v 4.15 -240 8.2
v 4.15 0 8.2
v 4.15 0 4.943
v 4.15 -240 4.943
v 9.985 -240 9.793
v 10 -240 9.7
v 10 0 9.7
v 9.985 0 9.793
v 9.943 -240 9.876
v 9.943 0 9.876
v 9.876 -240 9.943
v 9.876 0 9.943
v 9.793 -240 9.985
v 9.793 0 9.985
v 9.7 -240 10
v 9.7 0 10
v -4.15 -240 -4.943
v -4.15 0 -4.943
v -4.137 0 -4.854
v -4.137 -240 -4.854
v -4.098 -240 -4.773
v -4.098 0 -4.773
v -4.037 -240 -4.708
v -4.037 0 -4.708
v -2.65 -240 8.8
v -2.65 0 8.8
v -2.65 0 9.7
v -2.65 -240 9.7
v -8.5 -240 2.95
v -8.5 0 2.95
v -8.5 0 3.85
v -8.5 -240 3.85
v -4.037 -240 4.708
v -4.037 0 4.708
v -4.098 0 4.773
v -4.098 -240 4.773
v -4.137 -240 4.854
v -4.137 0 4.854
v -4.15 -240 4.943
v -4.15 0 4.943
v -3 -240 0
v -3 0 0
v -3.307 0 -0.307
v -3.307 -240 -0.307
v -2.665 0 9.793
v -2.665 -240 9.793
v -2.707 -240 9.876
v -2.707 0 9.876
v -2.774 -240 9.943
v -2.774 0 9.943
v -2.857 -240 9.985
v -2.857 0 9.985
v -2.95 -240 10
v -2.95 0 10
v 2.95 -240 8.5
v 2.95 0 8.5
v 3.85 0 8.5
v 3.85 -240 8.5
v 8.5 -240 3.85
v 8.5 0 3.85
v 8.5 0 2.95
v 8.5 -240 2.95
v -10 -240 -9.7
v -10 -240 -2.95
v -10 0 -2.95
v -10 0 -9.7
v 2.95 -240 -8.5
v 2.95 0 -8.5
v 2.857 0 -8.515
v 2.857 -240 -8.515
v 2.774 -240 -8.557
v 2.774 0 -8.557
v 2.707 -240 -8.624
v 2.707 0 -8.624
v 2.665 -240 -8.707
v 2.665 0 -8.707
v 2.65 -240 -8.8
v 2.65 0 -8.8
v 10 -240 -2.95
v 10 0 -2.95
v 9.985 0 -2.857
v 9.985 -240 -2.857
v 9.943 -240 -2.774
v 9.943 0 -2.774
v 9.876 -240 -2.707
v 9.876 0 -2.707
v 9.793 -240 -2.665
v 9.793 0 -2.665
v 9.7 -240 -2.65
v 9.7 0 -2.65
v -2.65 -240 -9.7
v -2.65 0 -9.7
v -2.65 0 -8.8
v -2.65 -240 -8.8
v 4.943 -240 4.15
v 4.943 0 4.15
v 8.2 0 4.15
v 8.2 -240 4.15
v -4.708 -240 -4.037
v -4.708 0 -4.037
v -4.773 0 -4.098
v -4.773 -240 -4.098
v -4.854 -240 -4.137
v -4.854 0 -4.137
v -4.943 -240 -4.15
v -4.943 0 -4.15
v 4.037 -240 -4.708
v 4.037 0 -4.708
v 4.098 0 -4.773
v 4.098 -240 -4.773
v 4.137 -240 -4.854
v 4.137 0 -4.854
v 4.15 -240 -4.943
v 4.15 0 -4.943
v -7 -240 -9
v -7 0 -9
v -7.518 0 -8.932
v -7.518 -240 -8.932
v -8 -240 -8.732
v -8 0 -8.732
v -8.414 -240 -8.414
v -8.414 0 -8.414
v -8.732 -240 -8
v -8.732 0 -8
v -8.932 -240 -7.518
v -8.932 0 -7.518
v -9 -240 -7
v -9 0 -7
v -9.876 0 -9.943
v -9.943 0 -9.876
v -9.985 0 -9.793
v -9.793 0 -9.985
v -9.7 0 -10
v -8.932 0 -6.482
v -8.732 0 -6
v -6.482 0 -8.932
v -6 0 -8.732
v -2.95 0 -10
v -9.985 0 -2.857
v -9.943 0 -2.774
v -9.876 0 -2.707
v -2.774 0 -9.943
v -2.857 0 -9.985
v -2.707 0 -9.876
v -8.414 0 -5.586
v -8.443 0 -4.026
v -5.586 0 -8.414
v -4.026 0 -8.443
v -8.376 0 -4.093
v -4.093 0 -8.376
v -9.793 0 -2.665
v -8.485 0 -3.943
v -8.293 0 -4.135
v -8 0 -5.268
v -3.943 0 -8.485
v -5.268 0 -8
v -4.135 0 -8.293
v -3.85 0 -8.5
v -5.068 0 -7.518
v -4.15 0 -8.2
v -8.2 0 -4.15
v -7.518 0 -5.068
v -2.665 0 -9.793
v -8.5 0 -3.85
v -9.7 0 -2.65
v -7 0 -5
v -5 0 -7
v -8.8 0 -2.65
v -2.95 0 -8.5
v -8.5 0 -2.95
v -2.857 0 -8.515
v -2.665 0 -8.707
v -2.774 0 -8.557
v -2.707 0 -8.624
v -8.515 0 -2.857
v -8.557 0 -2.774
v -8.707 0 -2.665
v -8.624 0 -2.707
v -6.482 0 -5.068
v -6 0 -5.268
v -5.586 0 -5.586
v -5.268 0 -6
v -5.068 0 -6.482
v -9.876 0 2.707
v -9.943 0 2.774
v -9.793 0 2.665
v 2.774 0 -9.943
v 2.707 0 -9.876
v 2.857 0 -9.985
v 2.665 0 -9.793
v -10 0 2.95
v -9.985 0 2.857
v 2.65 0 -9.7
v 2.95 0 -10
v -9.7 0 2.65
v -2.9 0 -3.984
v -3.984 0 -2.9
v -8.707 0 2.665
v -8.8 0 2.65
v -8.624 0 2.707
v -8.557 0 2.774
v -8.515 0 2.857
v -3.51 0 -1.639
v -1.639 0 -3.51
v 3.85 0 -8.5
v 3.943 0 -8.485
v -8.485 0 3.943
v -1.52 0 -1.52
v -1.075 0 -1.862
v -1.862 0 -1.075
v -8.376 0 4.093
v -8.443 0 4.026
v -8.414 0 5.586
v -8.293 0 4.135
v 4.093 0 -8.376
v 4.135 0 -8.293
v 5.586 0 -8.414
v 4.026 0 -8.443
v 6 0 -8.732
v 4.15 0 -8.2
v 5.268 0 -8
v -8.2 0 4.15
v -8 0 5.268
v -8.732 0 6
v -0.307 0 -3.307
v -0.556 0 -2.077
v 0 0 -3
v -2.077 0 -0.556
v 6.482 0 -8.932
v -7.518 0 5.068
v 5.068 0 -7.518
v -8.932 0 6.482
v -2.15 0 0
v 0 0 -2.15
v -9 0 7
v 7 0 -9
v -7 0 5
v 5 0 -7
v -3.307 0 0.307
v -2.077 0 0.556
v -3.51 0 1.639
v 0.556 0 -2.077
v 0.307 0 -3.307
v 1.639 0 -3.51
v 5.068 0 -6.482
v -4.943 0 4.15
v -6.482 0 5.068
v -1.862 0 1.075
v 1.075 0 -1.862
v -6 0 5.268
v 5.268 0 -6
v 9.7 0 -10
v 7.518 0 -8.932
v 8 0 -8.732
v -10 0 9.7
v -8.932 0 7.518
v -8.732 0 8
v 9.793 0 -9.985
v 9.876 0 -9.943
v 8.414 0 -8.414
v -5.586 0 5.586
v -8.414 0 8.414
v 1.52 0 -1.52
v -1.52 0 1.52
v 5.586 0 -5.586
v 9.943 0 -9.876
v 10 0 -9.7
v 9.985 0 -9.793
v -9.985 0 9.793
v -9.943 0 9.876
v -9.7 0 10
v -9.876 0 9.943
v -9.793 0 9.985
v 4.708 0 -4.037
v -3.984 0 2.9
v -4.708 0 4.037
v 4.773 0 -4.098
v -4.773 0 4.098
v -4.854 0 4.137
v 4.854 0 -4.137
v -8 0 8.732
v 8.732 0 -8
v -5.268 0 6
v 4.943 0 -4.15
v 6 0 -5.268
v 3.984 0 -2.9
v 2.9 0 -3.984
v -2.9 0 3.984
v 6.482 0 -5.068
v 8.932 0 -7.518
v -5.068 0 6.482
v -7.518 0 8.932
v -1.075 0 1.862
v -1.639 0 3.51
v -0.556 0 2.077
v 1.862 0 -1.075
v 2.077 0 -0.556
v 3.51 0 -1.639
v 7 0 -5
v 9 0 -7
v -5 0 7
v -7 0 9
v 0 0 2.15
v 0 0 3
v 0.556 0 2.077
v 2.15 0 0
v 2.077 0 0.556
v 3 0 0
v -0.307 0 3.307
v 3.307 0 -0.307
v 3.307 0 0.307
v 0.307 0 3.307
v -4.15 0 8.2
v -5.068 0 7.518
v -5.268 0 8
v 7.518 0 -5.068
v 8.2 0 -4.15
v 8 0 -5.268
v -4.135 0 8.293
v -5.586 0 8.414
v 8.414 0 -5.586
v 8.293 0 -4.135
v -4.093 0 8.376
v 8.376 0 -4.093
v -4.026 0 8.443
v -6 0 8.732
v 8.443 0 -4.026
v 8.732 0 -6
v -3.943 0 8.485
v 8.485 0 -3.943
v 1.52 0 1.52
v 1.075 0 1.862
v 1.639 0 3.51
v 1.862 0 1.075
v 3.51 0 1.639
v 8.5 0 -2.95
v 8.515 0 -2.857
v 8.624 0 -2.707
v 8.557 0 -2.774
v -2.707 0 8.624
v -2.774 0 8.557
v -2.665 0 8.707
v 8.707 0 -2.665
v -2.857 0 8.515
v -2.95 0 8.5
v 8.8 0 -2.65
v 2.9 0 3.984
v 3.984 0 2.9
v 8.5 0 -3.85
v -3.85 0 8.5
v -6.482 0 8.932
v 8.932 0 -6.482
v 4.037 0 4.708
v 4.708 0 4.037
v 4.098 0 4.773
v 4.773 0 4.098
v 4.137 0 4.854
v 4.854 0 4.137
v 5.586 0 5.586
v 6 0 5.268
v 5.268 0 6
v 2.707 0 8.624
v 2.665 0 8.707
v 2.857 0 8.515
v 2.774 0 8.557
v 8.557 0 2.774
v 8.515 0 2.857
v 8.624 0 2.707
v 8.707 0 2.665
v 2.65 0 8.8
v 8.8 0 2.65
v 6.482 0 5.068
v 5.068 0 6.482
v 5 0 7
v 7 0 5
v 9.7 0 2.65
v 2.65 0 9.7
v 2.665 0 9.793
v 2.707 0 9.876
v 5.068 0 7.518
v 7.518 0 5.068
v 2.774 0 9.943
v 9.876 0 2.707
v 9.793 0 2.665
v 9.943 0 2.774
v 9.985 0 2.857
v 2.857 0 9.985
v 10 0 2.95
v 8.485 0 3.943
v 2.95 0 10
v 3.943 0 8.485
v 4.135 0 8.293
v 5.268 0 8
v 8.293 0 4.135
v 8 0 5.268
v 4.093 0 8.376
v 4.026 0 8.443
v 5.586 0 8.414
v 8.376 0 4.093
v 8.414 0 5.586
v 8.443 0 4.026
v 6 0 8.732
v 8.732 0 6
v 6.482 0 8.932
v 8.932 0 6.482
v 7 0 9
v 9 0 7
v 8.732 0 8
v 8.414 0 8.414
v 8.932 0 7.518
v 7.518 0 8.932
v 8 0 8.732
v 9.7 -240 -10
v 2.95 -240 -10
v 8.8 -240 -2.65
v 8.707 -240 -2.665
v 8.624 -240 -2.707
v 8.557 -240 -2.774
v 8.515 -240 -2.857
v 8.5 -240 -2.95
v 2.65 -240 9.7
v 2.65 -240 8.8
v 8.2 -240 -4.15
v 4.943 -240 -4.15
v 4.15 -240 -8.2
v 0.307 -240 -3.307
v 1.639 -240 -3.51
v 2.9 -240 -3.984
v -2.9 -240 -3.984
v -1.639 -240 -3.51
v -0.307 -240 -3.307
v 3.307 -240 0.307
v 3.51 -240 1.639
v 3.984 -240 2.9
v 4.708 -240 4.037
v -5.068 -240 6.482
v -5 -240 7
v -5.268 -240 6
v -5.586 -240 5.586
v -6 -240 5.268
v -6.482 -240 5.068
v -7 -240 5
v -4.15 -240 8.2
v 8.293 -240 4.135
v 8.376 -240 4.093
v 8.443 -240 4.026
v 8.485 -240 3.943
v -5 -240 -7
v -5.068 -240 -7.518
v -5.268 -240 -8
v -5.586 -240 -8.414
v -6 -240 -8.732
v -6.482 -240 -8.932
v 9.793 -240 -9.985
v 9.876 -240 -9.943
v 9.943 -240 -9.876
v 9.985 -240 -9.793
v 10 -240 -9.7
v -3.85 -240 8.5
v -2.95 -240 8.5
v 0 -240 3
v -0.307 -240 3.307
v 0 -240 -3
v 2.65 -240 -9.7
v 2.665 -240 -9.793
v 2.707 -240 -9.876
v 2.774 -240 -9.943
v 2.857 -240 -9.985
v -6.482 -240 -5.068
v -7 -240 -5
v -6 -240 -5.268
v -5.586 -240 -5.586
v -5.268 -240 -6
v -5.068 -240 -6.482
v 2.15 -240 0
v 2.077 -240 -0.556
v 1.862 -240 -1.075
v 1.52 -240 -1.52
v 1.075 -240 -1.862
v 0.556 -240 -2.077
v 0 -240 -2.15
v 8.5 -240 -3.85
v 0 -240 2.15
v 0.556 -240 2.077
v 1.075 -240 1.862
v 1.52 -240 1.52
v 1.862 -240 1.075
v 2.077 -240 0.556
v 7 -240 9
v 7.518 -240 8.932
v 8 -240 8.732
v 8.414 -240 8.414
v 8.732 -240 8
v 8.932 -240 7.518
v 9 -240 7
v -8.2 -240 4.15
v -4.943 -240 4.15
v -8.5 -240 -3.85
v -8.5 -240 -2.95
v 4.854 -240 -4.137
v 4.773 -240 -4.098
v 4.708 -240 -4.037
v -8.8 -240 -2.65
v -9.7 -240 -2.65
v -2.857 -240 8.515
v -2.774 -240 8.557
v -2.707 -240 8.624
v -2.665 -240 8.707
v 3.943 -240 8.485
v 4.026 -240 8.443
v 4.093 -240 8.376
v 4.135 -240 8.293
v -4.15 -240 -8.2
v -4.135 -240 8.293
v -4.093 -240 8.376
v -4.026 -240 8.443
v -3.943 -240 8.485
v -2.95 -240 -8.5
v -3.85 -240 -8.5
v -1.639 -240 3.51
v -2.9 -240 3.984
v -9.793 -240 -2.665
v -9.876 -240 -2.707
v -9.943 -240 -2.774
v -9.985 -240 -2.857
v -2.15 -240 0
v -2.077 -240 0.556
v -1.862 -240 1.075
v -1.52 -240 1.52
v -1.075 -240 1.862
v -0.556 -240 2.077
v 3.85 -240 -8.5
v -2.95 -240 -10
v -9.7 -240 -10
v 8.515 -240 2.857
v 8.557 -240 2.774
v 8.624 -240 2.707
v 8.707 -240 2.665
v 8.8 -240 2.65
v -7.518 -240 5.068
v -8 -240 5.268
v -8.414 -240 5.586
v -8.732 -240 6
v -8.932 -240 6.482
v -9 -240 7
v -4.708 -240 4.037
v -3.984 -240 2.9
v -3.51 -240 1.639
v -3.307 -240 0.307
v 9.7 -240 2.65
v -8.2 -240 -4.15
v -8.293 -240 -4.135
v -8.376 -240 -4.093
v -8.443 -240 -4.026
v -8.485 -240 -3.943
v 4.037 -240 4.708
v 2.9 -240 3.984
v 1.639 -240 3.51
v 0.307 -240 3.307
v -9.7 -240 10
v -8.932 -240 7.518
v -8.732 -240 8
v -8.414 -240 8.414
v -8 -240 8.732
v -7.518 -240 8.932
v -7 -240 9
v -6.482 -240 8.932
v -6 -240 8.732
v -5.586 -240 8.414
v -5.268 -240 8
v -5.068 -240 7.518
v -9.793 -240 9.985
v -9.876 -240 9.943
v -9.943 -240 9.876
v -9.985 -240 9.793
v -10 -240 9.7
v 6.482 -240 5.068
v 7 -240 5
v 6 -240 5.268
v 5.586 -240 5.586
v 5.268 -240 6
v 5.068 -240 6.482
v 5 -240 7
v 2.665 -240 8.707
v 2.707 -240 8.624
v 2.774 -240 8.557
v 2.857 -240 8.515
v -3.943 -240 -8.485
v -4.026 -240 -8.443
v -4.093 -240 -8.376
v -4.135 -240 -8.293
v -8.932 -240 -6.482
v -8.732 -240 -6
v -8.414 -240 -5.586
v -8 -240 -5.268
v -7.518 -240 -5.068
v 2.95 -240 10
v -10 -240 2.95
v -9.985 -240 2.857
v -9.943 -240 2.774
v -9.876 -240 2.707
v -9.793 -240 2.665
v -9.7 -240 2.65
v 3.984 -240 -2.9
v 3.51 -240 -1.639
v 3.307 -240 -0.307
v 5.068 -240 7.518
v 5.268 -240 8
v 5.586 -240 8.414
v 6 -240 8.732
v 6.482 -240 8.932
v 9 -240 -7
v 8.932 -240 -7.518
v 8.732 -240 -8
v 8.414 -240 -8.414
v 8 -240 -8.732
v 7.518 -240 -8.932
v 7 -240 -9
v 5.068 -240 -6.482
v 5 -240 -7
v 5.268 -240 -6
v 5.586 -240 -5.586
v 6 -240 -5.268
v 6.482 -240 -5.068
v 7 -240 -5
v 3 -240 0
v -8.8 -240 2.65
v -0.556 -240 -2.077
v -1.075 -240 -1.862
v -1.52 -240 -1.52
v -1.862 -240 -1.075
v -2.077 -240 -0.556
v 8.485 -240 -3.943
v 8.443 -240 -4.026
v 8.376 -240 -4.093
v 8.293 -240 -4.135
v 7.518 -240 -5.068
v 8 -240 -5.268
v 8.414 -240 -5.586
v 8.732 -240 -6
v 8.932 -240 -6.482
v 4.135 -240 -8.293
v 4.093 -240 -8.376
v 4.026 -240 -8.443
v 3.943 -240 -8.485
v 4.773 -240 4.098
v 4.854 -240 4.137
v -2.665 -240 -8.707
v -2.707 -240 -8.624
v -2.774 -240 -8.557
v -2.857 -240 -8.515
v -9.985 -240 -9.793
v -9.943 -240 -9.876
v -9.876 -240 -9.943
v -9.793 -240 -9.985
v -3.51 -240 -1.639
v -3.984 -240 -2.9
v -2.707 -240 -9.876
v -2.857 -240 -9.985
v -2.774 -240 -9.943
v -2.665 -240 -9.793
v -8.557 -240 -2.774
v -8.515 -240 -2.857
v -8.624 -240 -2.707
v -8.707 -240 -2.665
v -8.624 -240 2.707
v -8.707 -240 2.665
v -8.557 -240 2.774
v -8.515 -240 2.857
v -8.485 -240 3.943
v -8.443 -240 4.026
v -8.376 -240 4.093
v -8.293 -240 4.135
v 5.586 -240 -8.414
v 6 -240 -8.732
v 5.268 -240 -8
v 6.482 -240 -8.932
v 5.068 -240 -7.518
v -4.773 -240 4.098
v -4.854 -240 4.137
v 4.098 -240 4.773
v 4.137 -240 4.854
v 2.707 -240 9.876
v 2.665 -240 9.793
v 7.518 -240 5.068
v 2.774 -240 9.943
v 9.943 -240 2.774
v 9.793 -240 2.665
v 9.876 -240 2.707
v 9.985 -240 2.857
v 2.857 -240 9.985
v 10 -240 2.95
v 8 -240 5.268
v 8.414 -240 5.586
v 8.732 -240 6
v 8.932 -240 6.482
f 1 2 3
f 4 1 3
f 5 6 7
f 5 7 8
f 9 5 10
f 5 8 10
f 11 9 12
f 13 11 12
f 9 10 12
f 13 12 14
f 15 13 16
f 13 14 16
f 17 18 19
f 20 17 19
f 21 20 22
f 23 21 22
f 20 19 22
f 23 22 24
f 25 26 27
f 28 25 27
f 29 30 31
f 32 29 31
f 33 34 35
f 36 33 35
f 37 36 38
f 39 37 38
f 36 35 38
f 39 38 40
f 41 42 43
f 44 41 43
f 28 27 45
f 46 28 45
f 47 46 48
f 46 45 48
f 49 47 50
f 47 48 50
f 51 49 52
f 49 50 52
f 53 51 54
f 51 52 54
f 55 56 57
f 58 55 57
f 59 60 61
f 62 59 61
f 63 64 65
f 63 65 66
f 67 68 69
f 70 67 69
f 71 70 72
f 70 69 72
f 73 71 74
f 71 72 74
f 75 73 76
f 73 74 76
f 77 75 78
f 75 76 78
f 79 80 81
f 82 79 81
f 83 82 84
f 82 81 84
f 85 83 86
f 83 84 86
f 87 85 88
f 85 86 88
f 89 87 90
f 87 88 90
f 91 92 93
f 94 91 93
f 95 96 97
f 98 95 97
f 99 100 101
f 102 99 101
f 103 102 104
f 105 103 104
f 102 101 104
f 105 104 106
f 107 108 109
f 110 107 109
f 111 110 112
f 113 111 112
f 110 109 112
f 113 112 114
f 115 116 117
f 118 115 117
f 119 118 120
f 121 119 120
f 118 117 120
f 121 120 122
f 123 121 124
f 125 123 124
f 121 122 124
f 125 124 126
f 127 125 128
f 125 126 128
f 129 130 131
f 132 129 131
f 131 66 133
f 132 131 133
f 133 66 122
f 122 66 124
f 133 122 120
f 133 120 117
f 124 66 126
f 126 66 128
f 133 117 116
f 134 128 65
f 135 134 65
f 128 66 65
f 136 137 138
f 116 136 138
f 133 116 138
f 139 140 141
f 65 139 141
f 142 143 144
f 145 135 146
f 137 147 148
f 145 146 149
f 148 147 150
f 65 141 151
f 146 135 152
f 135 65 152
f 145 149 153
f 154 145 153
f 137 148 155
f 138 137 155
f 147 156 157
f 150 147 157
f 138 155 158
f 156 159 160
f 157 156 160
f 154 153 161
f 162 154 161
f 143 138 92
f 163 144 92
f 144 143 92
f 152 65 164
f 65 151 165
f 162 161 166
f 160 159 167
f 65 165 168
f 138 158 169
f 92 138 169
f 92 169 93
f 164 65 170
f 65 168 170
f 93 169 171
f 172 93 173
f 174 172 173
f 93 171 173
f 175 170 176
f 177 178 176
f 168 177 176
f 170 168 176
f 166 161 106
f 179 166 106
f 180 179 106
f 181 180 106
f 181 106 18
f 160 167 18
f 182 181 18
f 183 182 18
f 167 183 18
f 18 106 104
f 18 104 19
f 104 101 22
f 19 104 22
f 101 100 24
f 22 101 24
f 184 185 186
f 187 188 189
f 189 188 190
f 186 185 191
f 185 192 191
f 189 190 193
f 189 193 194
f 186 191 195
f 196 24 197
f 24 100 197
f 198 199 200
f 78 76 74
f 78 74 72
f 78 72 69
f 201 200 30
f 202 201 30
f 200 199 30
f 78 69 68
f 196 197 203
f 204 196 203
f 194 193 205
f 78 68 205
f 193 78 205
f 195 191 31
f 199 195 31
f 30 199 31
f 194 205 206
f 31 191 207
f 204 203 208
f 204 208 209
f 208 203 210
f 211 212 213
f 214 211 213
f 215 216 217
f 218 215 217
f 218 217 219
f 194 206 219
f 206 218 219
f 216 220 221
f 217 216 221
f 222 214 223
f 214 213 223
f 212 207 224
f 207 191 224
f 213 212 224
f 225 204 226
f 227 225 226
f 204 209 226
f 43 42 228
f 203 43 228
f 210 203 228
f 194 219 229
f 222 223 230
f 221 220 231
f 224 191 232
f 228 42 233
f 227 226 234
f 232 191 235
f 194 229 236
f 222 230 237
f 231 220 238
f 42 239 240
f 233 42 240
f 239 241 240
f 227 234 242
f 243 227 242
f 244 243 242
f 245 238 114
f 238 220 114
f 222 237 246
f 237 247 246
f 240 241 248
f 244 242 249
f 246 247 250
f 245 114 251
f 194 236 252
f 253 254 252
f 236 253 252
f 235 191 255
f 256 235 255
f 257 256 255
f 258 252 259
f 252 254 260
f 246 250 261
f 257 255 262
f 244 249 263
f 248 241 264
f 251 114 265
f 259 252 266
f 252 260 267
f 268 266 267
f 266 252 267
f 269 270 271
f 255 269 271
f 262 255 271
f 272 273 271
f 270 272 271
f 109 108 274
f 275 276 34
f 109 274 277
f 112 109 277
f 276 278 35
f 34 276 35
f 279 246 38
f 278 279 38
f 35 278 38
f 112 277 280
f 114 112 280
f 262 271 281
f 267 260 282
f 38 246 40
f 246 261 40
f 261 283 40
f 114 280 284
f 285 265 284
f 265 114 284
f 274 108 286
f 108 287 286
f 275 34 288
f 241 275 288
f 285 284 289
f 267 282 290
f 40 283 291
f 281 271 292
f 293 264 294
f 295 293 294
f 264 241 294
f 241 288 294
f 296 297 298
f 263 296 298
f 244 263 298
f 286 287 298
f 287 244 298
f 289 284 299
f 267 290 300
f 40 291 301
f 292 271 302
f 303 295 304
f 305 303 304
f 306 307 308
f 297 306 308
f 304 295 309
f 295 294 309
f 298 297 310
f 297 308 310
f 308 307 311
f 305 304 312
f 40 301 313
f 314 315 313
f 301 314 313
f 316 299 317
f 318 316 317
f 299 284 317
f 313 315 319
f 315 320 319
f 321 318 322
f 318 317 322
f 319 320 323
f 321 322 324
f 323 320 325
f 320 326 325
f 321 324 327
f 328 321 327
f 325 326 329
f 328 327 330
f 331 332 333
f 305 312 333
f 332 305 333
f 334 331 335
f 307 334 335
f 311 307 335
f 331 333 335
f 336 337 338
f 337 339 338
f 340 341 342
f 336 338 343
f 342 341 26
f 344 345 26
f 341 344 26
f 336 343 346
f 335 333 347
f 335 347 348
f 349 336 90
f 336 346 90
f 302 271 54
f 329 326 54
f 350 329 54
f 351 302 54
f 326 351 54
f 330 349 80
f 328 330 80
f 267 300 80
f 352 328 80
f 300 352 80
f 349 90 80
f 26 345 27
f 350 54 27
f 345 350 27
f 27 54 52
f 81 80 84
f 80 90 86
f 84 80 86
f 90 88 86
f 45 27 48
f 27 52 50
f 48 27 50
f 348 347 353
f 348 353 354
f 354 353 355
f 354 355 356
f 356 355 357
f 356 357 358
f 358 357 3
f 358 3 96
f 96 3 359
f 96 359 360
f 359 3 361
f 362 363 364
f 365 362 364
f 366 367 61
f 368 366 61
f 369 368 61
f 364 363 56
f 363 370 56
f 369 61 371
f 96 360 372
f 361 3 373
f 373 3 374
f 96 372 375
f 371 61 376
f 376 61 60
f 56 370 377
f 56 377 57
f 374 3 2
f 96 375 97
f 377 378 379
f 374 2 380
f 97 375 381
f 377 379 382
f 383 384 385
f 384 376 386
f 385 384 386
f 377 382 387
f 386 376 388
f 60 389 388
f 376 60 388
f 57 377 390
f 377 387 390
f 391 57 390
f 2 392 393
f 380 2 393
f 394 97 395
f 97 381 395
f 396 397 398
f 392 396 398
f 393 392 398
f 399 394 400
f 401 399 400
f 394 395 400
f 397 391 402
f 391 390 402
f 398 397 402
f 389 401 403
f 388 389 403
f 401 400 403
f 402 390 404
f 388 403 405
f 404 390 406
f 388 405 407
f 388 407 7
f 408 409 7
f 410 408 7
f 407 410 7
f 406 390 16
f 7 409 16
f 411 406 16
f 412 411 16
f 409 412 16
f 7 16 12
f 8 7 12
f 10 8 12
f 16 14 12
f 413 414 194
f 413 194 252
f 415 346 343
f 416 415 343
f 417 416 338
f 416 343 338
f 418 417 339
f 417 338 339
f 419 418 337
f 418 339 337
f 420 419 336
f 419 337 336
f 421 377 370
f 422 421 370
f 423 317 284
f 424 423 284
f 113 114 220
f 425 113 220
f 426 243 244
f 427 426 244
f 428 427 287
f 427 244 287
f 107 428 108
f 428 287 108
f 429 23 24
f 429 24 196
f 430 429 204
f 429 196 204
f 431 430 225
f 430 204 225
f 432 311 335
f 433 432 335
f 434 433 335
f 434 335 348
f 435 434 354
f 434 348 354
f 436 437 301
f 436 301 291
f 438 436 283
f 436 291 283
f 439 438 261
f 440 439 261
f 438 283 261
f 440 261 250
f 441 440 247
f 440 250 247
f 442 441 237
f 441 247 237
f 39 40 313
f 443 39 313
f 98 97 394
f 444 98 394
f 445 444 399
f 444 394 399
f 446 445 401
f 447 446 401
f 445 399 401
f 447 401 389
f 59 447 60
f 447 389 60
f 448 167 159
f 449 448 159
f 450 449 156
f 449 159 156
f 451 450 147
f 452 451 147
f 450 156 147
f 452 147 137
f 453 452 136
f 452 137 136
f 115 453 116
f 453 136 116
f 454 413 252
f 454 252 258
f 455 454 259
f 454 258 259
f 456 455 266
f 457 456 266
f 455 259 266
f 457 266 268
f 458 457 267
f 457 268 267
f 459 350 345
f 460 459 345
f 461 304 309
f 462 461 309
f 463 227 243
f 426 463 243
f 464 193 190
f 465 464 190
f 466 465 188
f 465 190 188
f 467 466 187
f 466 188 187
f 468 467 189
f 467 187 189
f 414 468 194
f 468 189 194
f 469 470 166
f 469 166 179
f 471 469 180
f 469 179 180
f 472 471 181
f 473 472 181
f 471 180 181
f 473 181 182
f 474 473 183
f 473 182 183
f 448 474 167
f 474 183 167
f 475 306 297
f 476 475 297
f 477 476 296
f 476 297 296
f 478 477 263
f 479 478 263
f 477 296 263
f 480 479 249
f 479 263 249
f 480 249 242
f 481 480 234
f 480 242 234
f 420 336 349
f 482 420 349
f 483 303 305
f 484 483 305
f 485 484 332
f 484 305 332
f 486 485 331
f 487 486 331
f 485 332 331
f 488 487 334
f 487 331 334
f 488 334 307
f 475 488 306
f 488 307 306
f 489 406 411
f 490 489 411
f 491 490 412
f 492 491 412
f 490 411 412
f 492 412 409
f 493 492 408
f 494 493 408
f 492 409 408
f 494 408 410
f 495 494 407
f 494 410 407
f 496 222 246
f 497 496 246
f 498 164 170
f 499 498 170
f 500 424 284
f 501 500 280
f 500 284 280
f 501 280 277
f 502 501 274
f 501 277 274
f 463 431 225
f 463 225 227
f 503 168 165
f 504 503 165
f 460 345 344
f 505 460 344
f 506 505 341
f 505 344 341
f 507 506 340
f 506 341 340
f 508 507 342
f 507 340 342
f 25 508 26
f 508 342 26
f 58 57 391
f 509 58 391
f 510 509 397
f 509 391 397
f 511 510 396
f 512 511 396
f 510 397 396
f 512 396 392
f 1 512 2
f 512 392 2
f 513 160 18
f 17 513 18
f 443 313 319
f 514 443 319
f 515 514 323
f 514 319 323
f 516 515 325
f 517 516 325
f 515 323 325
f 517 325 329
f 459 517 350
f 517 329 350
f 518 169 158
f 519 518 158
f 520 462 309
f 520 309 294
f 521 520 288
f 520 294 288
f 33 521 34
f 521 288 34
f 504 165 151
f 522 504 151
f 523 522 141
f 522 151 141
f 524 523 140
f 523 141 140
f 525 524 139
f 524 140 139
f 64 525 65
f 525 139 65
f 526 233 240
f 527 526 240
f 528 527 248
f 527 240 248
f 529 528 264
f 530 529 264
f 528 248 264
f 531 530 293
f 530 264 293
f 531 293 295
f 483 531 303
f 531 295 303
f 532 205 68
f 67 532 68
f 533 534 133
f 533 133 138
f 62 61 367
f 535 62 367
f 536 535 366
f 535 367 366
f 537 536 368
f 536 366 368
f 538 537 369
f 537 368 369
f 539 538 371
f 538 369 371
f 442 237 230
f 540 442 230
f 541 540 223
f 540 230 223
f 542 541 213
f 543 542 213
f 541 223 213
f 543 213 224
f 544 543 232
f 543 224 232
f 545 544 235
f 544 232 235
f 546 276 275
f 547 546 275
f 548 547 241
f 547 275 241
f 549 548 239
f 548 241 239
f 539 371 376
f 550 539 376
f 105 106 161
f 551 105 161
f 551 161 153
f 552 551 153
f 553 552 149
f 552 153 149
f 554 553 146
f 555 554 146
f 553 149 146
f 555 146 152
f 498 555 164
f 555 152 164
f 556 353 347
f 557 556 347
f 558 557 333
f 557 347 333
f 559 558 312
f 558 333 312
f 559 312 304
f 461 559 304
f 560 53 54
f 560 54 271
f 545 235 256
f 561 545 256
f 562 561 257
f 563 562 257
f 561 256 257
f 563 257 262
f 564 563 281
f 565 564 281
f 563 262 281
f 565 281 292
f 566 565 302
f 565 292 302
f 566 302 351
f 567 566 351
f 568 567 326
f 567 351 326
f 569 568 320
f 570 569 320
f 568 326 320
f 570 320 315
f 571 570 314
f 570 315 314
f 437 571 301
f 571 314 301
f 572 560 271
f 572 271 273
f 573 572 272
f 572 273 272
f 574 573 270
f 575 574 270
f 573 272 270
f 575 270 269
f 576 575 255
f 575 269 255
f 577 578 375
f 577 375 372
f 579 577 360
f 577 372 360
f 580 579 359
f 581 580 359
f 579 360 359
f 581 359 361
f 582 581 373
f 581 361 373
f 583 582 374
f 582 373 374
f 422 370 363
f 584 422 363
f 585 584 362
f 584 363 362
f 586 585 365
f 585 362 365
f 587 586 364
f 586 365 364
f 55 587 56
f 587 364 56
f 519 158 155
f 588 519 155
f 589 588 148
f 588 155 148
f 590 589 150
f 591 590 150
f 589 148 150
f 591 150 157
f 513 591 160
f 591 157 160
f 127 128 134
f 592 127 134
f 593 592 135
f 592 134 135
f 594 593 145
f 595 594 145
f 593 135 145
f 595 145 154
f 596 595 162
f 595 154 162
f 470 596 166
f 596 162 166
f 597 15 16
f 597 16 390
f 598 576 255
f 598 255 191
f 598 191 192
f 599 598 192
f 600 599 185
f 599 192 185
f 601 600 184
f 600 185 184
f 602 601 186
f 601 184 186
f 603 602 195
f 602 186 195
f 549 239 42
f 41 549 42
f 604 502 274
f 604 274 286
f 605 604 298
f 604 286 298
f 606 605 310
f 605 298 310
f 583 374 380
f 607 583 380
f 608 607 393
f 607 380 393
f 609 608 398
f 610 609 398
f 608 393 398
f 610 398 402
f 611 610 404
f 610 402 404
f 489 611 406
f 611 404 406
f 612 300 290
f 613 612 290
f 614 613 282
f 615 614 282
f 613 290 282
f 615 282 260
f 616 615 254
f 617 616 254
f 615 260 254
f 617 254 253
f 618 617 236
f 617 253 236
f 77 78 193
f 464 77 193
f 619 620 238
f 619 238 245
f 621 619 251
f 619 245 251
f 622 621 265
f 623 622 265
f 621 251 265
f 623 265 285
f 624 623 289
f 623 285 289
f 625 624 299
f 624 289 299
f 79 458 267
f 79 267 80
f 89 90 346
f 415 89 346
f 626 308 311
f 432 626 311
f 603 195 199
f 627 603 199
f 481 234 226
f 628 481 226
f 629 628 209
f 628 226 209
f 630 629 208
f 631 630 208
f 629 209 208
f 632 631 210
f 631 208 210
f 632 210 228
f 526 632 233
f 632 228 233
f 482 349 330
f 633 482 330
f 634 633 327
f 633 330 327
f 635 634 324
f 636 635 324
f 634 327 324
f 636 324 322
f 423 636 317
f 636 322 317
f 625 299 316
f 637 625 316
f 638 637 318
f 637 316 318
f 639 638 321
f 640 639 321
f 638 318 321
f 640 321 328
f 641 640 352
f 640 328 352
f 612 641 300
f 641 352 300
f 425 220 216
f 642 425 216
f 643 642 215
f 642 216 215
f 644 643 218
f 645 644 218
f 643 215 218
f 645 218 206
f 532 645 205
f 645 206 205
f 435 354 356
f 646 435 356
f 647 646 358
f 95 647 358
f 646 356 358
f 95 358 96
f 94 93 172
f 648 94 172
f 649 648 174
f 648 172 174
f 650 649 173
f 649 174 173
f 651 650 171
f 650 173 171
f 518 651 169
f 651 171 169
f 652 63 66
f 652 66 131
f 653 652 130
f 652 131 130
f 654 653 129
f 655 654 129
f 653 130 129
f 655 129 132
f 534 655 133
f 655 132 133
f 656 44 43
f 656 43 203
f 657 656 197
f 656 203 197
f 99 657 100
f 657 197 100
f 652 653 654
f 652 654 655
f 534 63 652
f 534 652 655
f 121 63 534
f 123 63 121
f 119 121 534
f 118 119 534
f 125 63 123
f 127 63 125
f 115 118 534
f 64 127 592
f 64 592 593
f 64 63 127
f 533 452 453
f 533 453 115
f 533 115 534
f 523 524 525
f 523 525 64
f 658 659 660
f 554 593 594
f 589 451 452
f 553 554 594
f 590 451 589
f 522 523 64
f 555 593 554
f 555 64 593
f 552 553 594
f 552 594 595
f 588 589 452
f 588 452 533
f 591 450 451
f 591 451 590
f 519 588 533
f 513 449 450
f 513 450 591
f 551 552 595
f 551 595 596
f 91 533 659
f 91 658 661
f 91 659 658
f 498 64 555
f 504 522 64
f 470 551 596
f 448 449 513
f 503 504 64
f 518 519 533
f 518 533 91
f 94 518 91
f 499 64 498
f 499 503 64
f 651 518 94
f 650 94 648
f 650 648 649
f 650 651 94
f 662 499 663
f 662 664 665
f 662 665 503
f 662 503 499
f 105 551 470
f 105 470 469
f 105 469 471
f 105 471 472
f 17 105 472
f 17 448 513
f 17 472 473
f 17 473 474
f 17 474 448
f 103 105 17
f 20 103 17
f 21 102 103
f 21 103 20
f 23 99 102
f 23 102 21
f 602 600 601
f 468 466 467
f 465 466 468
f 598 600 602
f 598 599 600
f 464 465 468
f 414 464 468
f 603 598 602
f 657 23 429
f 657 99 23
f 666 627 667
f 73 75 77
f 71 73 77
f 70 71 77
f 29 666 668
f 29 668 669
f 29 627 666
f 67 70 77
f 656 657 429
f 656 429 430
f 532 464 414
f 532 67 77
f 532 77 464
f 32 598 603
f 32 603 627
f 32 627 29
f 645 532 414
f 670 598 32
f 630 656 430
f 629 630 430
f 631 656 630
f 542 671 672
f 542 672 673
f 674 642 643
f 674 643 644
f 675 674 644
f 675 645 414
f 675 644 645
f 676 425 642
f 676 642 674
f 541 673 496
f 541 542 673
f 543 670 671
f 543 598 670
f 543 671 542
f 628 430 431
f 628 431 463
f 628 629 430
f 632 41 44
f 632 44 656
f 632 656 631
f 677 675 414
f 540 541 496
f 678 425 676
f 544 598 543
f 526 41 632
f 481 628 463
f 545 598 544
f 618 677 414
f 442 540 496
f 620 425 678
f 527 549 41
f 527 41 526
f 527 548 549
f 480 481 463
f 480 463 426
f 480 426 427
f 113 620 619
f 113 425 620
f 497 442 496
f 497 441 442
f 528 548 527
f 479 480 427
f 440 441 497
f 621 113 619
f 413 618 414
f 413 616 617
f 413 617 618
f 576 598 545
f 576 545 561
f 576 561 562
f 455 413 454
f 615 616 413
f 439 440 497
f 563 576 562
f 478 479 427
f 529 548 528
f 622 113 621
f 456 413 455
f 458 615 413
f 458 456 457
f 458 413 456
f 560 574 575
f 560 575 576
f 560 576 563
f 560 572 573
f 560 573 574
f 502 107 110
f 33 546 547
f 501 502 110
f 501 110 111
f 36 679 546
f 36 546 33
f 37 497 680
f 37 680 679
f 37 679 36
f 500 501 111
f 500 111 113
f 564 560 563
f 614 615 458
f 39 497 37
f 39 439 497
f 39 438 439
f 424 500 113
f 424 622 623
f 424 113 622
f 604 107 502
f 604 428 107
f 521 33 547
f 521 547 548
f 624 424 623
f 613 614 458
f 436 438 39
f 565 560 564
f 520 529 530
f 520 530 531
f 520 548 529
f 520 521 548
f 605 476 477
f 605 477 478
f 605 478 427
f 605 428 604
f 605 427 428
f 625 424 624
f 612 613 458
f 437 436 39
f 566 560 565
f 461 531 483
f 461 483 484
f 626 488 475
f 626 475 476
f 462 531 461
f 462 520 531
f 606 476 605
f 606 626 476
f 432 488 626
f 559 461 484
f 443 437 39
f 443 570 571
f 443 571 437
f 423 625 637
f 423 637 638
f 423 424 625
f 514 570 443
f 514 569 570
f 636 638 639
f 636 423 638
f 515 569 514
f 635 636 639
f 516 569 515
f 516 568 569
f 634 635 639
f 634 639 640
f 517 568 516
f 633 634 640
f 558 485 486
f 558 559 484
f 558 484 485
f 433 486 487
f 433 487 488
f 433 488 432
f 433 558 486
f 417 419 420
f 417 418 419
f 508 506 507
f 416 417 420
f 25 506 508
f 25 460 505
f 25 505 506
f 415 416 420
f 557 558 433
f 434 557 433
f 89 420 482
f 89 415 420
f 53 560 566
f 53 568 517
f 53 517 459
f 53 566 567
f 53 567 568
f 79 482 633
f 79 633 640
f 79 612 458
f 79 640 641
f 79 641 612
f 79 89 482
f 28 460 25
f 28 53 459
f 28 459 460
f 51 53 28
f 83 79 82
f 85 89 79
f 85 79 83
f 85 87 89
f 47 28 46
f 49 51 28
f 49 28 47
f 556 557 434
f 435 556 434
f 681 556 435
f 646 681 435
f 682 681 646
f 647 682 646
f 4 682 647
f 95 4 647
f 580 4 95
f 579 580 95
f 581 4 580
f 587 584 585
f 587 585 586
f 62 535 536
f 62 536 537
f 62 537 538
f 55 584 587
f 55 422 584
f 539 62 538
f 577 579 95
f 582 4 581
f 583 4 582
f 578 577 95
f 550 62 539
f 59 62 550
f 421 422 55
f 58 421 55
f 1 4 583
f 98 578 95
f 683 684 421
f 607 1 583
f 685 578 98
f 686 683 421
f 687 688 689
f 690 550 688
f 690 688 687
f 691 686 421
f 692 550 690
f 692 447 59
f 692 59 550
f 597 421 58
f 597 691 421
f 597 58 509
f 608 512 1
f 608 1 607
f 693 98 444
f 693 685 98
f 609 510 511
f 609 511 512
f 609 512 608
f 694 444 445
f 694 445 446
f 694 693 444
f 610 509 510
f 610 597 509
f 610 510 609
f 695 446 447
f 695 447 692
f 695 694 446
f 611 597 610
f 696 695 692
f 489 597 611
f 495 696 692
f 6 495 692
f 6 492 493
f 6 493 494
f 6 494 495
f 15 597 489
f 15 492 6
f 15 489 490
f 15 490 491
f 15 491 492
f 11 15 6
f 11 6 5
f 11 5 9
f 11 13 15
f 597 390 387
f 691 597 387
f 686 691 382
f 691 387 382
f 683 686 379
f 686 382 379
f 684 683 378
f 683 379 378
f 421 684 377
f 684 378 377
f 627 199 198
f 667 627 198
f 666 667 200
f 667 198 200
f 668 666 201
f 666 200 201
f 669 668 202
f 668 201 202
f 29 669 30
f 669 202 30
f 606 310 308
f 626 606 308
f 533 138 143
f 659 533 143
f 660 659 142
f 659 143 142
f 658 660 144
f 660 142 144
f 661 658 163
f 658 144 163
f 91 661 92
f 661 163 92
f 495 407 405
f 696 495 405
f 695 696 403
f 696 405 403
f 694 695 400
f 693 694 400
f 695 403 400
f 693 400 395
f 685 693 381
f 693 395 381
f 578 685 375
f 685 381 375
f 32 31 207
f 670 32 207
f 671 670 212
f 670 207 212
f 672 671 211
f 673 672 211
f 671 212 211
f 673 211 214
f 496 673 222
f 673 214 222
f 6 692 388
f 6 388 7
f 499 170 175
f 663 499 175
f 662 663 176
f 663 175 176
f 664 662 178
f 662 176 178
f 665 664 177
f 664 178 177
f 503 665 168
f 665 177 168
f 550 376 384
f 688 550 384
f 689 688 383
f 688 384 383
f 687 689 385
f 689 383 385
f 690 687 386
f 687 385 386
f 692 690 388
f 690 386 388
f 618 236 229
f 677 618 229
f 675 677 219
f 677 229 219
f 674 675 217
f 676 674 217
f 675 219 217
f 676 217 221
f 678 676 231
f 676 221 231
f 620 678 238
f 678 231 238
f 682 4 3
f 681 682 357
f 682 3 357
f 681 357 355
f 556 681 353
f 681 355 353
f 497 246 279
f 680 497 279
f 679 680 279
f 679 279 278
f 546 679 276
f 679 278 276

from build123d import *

# Parameters (mm, degrees)
F1_DEPTH = 240


# Not quite as in the source:
# - ends of sketch curves that miss each other by under 0.0002 mm in the source are joined


with BuildPart() as f1:
    # F0 (on Front) → F1 (new body)
    with BuildSketch(Plane.XZ):
        with BuildLine():
            ThreePointArc((0, 2.15), (1.5202795796, 1.5202795796), (2.15, 0))
            Line((2.15, 0), (3, 0))
            Line((3, 0), (3.307278, 0.307278))
            ThreePointArc((3.307278, 0.307278), (3.7143803747, 2.2820219924), (4.7078187099, 4.0365664363))
            ThreePointArc((4.7078187099, 4.0365664363), (4.812308461, 4.1201573706), (4.94275, 4.15))
            Line((4.94275, 4.15), (8.2, 4.15))
            ThreePointArc((8.2, 4.15), (8.4121320344, 4.0621320344), (8.5, 3.85))
            Line((8.5, 3.85), (8.5, 2.95))
            ThreePointArc((8.5, 2.95), (8.5878679656, 2.7378679656), (8.8, 2.65))
            Line((8.8, 2.65), (9.7, 2.65))
            ThreePointArc((9.7, 2.65), (9.9121320344, 2.7378679656), (10, 2.95))
            Line((10, 2.95), (10, 9.7))
            ThreePointArc((10, 9.7), (9.9121320344, 9.9121320344), (9.7, 10))
            Line((9.7, 10), (2.95, 10))
            ThreePointArc((2.95, 10), (2.7378679656, 9.9121320344), (2.65, 9.7))
            Line((2.65, 9.7), (2.65, 8.8))
            ThreePointArc((2.65, 8.8), (2.7378679656, 8.5878679656), (2.95, 8.5))
            Line((2.95, 8.5), (3.85, 8.5))
            ThreePointArc((3.85, 8.5), (4.0621320344, 8.4121320344), (4.15, 8.2))
            Line((4.15, 8.2), (4.15, 4.94275))
            ThreePointArc((4.15, 4.94275), (4.1201572004, 4.8123081084), (4.036566086, 4.7078178916))
            ThreePointArc((4.036566086, 4.7078178916), (2.2820216259, 3.7143802371), (0.3072779813, 3.3072783955))
            Line((0.3072779813, 3.3072783955), (0, 3))
            Line((0, 3), (0, 2.15))
        make_face()
        with BuildLine():
            ThreePointArc((7, 9), (8.4142135624, 8.4142135624), (9, 7))
            ThreePointArc((9, 7), (8.4142135624, 5.5857864376), (7, 5))
            ThreePointArc((7, 5), (5.5857864376, 5.5857864376), (5, 7))
            ThreePointArc((5, 7), (5.5857864376, 8.4142135624), (7, 9))
        make_face(mode=Mode.SUBTRACT)
        with BuildLine():
            Line((3, 0), (2.15, 0))
            ThreePointArc((2.15, 0), (1.5202795796, -1.5202795796), (0, -2.15))
            Line((0, -2.15), (0, -3))
            Line((0, -3), (0.307278, -3.307277))
            ThreePointArc((0.307278, -3.307277), (2.2820216259, -3.7143792371), (4.036565823, -4.7078172229))
            ThreePointArc((4.036565823, -4.7078172229), (4.1201572004, -4.8123071084), (4.15, -4.942749))
            Line((4.15, -4.942749), (4.15, -8.2))
            ThreePointArc((4.15, -8.2), (4.0621320344, -8.4121320344), (3.85, -8.5))
            Line((3.85, -8.5), (2.95, -8.5))
            ThreePointArc((2.95, -8.5), (2.7378679656, -8.5878679656), (2.65, -8.8))
            Line((2.65, -8.8), (2.65, -9.7))
            ThreePointArc((2.65, -9.7), (2.7378679656, -9.9121320344), (2.95, -10))
            Line((2.95, -10), (9.7, -10))
            ThreePointArc((9.7, -10), (9.9121320344, -9.9121320344), (10, -9.7))
            Line((10, -9.7), (10, -2.95))
            ThreePointArc((10, -2.95), (9.9121320344, -2.7378679656), (9.7, -2.65))
            Line((9.7, -2.65), (8.8, -2.65))
            ThreePointArc((8.8, -2.65), (8.5878679656, -2.7378679656), (8.5, -2.95))
            Line((8.5, -2.95), (8.5, -3.85))
            ThreePointArc((8.5, -3.85), (8.4121320344, -4.0621320344), (8.2, -4.15))
            Line((8.2, -4.15), (4.94275, -4.15))
            ThreePointArc((4.94275, -4.15), (4.8123081084, -4.1201572004), (4.7078178916, -4.036566086))
            ThreePointArc((4.7078178916, -4.036566086), (3.7143800615, -2.2820211583), (3.3072783483, -0.3072769835))
            Line((3.3072783483, -0.3072769835), (3, 0))
        make_face()
        with BuildLine():
            ThreePointArc((7, -5), (8.4142135624, -5.5857864376), (9, -7))
            ThreePointArc((9, -7), (8.4142135624, -8.4142135624), (7, -9))
            ThreePointArc((7, -9), (5.5857864376, -8.4142135624), (5, -7))
            ThreePointArc((5, -7), (5.5857864376, -5.5857864376), (7, -5))
        make_face(mode=Mode.SUBTRACT)
        with BuildLine():
            ThreePointArc((-2.15, 0), (-1.5202795796, 1.5202795796), (0, 2.15))
            Line((0, 2.15), (0, 3))
            Line((0, 3), (-0.307277, 3.307278))
            ThreePointArc((-0.307277, 3.307278), (-2.2820211583, 3.7143800615), (-4.036565823, 4.7078182229))
            ThreePointArc((-4.036565823, 4.7078182229), (-4.1201572004, 4.8123081084), (-4.15, 4.94275))
            Line((-4.15, 4.94275), (-4.15, 8.2))
            ThreePointArc((-4.15, 8.2), (-4.0621320344, 8.4121320344), (-3.85, 8.5))
            Line((-3.85, 8.5), (-2.95, 8.5))
            ThreePointArc((-2.95, 8.5), (-2.7378679656, 8.5878679656), (-2.65, 8.8))
            Line((-2.65, 8.8), (-2.65, 9.7))
            ThreePointArc((-2.65, 9.7), (-2.7378679656, 9.9121320344), (-2.95, 10))
            Line((-2.95, 10), (-9.7, 10))
            ThreePointArc((-9.7, 10), (-9.9121320344, 9.9121320344), (-10, 9.7))
            Line((-10, 9.7), (-10, 2.95))
            ThreePointArc((-10, 2.95), (-9.9121320344, 2.7378679656), (-9.7, 2.65))
            Line((-9.7, 2.65), (-8.8, 2.65))
            ThreePointArc((-8.8, 2.65), (-8.5878679656, 2.7378679656), (-8.5, 2.95))
            Line((-8.5, 2.95), (-8.5, 3.85))
            ThreePointArc((-8.5, 3.85), (-8.4121320344, 4.0621320344), (-8.2, 4.15))
            Line((-8.2, 4.15), (-4.942749, 4.15))
            ThreePointArc((-4.942749, 4.15), (-4.812307461, 4.1201573706), (-4.7078173786, 4.0365666993))
            ThreePointArc((-4.7078173786, 4.0365666993), (-3.7143793747, 2.2820219924), (-3.3072773955, 0.3072779813))
            Line((-3.3072773955, 0.3072779813), (-3, 0))
            Line((-3, 0), (-2.15, 0))
        make_face()
        with BuildLine():
            ThreePointArc((-7, 5), (-8.4142135624, 5.5857864376), (-9, 7))
            ThreePointArc((-9, 7), (-8.4142135624, 8.4142135624), (-7, 9))
            ThreePointArc((-7, 9), (-5.5857864376, 8.4142135624), (-5, 7))
            ThreePointArc((-5, 7), (-5.5857864376, 5.5857864376), (-7, 5))
        make_face(mode=Mode.SUBTRACT)
        with BuildLine():
            Line((0, -3), (0, -2.15))
            ThreePointArc((0, -2.15), (-1.5202795796, -1.5202795796), (-2.15, 0))
            Line((-2.15, 0), (-3, 0))
            Line((-3, 0), (-3.307277, -0.307277))
            ThreePointArc((-3.307277, -0.307277), (-3.7143790615, -2.2820211583), (-4.7078172229, -4.036565823))
            ThreePointArc((-4.7078172229, -4.036565823), (-4.8123071084, -4.1201572004), (-4.942749, -4.15))
            Line((-4.942749, -4.15), (-8.2, -4.15))
            ThreePointArc((-8.2, -4.15), (-8.4121320344, -4.0621320344), (-8.5, -3.85))
            Line((-8.5, -3.85), (-8.5, -2.95))
            ThreePointArc((-8.5, -2.95), (-8.5878679656, -2.7378679656), (-8.8, -2.65))
            Line((-8.8, -2.65), (-9.7, -2.65))
            ThreePointArc((-9.7, -2.65), (-9.9121320344, -2.7378679656), (-10, -2.95))
            Line((-10, -2.95), (-10, -9.7))
            ThreePointArc((-10, -9.7), (-9.9121320344, -9.9121320344), (-9.7, -10))
            Line((-9.7, -10), (-2.95, -10))
            ThreePointArc((-2.95, -10), (-2.7378679656, -9.9121320344), (-2.65, -9.7))
            Line((-2.65, -9.7), (-2.65, -8.8))
            ThreePointArc((-2.65, -8.8), (-2.7378679656, -8.5878679656), (-2.95, -8.5))
            Line((-2.95, -8.5), (-3.85, -8.5))
            ThreePointArc((-3.85, -8.5), (-4.0621320344, -8.4121320344), (-4.15, -8.2))
            Line((-4.15, -8.2), (-4.15, -4.942749))
            ThreePointArc((-4.15, -4.942749), (-4.1201572004, -4.8123071084), (-4.036566086, -4.7078168916))
            ThreePointArc((-4.036566086, -4.7078168916), (-2.2820211583, -3.7143790615), (-0.3072769835, -3.3072773483))
            Line((-0.3072769835, -3.3072773483), (0, -3))
        make_face()
        with BuildLine():
            ThreePointArc((-7, -9), (-8.4142135624, -8.4142135624), (-9, -7))
            ThreePointArc((-9, -7), (-8.4142135624, -5.5857864376), (-7, -5))
            ThreePointArc((-7, -5), (-5.5857864376, -5.5857864376), (-5, -7))
            ThreePointArc((-5, -7), (-5.5857864376, -8.4142135624), (-7, -9))
        make_face(mode=Mode.SUBTRACT)
    extrude(amount=F1_DEPTH)


solid = f1.part
